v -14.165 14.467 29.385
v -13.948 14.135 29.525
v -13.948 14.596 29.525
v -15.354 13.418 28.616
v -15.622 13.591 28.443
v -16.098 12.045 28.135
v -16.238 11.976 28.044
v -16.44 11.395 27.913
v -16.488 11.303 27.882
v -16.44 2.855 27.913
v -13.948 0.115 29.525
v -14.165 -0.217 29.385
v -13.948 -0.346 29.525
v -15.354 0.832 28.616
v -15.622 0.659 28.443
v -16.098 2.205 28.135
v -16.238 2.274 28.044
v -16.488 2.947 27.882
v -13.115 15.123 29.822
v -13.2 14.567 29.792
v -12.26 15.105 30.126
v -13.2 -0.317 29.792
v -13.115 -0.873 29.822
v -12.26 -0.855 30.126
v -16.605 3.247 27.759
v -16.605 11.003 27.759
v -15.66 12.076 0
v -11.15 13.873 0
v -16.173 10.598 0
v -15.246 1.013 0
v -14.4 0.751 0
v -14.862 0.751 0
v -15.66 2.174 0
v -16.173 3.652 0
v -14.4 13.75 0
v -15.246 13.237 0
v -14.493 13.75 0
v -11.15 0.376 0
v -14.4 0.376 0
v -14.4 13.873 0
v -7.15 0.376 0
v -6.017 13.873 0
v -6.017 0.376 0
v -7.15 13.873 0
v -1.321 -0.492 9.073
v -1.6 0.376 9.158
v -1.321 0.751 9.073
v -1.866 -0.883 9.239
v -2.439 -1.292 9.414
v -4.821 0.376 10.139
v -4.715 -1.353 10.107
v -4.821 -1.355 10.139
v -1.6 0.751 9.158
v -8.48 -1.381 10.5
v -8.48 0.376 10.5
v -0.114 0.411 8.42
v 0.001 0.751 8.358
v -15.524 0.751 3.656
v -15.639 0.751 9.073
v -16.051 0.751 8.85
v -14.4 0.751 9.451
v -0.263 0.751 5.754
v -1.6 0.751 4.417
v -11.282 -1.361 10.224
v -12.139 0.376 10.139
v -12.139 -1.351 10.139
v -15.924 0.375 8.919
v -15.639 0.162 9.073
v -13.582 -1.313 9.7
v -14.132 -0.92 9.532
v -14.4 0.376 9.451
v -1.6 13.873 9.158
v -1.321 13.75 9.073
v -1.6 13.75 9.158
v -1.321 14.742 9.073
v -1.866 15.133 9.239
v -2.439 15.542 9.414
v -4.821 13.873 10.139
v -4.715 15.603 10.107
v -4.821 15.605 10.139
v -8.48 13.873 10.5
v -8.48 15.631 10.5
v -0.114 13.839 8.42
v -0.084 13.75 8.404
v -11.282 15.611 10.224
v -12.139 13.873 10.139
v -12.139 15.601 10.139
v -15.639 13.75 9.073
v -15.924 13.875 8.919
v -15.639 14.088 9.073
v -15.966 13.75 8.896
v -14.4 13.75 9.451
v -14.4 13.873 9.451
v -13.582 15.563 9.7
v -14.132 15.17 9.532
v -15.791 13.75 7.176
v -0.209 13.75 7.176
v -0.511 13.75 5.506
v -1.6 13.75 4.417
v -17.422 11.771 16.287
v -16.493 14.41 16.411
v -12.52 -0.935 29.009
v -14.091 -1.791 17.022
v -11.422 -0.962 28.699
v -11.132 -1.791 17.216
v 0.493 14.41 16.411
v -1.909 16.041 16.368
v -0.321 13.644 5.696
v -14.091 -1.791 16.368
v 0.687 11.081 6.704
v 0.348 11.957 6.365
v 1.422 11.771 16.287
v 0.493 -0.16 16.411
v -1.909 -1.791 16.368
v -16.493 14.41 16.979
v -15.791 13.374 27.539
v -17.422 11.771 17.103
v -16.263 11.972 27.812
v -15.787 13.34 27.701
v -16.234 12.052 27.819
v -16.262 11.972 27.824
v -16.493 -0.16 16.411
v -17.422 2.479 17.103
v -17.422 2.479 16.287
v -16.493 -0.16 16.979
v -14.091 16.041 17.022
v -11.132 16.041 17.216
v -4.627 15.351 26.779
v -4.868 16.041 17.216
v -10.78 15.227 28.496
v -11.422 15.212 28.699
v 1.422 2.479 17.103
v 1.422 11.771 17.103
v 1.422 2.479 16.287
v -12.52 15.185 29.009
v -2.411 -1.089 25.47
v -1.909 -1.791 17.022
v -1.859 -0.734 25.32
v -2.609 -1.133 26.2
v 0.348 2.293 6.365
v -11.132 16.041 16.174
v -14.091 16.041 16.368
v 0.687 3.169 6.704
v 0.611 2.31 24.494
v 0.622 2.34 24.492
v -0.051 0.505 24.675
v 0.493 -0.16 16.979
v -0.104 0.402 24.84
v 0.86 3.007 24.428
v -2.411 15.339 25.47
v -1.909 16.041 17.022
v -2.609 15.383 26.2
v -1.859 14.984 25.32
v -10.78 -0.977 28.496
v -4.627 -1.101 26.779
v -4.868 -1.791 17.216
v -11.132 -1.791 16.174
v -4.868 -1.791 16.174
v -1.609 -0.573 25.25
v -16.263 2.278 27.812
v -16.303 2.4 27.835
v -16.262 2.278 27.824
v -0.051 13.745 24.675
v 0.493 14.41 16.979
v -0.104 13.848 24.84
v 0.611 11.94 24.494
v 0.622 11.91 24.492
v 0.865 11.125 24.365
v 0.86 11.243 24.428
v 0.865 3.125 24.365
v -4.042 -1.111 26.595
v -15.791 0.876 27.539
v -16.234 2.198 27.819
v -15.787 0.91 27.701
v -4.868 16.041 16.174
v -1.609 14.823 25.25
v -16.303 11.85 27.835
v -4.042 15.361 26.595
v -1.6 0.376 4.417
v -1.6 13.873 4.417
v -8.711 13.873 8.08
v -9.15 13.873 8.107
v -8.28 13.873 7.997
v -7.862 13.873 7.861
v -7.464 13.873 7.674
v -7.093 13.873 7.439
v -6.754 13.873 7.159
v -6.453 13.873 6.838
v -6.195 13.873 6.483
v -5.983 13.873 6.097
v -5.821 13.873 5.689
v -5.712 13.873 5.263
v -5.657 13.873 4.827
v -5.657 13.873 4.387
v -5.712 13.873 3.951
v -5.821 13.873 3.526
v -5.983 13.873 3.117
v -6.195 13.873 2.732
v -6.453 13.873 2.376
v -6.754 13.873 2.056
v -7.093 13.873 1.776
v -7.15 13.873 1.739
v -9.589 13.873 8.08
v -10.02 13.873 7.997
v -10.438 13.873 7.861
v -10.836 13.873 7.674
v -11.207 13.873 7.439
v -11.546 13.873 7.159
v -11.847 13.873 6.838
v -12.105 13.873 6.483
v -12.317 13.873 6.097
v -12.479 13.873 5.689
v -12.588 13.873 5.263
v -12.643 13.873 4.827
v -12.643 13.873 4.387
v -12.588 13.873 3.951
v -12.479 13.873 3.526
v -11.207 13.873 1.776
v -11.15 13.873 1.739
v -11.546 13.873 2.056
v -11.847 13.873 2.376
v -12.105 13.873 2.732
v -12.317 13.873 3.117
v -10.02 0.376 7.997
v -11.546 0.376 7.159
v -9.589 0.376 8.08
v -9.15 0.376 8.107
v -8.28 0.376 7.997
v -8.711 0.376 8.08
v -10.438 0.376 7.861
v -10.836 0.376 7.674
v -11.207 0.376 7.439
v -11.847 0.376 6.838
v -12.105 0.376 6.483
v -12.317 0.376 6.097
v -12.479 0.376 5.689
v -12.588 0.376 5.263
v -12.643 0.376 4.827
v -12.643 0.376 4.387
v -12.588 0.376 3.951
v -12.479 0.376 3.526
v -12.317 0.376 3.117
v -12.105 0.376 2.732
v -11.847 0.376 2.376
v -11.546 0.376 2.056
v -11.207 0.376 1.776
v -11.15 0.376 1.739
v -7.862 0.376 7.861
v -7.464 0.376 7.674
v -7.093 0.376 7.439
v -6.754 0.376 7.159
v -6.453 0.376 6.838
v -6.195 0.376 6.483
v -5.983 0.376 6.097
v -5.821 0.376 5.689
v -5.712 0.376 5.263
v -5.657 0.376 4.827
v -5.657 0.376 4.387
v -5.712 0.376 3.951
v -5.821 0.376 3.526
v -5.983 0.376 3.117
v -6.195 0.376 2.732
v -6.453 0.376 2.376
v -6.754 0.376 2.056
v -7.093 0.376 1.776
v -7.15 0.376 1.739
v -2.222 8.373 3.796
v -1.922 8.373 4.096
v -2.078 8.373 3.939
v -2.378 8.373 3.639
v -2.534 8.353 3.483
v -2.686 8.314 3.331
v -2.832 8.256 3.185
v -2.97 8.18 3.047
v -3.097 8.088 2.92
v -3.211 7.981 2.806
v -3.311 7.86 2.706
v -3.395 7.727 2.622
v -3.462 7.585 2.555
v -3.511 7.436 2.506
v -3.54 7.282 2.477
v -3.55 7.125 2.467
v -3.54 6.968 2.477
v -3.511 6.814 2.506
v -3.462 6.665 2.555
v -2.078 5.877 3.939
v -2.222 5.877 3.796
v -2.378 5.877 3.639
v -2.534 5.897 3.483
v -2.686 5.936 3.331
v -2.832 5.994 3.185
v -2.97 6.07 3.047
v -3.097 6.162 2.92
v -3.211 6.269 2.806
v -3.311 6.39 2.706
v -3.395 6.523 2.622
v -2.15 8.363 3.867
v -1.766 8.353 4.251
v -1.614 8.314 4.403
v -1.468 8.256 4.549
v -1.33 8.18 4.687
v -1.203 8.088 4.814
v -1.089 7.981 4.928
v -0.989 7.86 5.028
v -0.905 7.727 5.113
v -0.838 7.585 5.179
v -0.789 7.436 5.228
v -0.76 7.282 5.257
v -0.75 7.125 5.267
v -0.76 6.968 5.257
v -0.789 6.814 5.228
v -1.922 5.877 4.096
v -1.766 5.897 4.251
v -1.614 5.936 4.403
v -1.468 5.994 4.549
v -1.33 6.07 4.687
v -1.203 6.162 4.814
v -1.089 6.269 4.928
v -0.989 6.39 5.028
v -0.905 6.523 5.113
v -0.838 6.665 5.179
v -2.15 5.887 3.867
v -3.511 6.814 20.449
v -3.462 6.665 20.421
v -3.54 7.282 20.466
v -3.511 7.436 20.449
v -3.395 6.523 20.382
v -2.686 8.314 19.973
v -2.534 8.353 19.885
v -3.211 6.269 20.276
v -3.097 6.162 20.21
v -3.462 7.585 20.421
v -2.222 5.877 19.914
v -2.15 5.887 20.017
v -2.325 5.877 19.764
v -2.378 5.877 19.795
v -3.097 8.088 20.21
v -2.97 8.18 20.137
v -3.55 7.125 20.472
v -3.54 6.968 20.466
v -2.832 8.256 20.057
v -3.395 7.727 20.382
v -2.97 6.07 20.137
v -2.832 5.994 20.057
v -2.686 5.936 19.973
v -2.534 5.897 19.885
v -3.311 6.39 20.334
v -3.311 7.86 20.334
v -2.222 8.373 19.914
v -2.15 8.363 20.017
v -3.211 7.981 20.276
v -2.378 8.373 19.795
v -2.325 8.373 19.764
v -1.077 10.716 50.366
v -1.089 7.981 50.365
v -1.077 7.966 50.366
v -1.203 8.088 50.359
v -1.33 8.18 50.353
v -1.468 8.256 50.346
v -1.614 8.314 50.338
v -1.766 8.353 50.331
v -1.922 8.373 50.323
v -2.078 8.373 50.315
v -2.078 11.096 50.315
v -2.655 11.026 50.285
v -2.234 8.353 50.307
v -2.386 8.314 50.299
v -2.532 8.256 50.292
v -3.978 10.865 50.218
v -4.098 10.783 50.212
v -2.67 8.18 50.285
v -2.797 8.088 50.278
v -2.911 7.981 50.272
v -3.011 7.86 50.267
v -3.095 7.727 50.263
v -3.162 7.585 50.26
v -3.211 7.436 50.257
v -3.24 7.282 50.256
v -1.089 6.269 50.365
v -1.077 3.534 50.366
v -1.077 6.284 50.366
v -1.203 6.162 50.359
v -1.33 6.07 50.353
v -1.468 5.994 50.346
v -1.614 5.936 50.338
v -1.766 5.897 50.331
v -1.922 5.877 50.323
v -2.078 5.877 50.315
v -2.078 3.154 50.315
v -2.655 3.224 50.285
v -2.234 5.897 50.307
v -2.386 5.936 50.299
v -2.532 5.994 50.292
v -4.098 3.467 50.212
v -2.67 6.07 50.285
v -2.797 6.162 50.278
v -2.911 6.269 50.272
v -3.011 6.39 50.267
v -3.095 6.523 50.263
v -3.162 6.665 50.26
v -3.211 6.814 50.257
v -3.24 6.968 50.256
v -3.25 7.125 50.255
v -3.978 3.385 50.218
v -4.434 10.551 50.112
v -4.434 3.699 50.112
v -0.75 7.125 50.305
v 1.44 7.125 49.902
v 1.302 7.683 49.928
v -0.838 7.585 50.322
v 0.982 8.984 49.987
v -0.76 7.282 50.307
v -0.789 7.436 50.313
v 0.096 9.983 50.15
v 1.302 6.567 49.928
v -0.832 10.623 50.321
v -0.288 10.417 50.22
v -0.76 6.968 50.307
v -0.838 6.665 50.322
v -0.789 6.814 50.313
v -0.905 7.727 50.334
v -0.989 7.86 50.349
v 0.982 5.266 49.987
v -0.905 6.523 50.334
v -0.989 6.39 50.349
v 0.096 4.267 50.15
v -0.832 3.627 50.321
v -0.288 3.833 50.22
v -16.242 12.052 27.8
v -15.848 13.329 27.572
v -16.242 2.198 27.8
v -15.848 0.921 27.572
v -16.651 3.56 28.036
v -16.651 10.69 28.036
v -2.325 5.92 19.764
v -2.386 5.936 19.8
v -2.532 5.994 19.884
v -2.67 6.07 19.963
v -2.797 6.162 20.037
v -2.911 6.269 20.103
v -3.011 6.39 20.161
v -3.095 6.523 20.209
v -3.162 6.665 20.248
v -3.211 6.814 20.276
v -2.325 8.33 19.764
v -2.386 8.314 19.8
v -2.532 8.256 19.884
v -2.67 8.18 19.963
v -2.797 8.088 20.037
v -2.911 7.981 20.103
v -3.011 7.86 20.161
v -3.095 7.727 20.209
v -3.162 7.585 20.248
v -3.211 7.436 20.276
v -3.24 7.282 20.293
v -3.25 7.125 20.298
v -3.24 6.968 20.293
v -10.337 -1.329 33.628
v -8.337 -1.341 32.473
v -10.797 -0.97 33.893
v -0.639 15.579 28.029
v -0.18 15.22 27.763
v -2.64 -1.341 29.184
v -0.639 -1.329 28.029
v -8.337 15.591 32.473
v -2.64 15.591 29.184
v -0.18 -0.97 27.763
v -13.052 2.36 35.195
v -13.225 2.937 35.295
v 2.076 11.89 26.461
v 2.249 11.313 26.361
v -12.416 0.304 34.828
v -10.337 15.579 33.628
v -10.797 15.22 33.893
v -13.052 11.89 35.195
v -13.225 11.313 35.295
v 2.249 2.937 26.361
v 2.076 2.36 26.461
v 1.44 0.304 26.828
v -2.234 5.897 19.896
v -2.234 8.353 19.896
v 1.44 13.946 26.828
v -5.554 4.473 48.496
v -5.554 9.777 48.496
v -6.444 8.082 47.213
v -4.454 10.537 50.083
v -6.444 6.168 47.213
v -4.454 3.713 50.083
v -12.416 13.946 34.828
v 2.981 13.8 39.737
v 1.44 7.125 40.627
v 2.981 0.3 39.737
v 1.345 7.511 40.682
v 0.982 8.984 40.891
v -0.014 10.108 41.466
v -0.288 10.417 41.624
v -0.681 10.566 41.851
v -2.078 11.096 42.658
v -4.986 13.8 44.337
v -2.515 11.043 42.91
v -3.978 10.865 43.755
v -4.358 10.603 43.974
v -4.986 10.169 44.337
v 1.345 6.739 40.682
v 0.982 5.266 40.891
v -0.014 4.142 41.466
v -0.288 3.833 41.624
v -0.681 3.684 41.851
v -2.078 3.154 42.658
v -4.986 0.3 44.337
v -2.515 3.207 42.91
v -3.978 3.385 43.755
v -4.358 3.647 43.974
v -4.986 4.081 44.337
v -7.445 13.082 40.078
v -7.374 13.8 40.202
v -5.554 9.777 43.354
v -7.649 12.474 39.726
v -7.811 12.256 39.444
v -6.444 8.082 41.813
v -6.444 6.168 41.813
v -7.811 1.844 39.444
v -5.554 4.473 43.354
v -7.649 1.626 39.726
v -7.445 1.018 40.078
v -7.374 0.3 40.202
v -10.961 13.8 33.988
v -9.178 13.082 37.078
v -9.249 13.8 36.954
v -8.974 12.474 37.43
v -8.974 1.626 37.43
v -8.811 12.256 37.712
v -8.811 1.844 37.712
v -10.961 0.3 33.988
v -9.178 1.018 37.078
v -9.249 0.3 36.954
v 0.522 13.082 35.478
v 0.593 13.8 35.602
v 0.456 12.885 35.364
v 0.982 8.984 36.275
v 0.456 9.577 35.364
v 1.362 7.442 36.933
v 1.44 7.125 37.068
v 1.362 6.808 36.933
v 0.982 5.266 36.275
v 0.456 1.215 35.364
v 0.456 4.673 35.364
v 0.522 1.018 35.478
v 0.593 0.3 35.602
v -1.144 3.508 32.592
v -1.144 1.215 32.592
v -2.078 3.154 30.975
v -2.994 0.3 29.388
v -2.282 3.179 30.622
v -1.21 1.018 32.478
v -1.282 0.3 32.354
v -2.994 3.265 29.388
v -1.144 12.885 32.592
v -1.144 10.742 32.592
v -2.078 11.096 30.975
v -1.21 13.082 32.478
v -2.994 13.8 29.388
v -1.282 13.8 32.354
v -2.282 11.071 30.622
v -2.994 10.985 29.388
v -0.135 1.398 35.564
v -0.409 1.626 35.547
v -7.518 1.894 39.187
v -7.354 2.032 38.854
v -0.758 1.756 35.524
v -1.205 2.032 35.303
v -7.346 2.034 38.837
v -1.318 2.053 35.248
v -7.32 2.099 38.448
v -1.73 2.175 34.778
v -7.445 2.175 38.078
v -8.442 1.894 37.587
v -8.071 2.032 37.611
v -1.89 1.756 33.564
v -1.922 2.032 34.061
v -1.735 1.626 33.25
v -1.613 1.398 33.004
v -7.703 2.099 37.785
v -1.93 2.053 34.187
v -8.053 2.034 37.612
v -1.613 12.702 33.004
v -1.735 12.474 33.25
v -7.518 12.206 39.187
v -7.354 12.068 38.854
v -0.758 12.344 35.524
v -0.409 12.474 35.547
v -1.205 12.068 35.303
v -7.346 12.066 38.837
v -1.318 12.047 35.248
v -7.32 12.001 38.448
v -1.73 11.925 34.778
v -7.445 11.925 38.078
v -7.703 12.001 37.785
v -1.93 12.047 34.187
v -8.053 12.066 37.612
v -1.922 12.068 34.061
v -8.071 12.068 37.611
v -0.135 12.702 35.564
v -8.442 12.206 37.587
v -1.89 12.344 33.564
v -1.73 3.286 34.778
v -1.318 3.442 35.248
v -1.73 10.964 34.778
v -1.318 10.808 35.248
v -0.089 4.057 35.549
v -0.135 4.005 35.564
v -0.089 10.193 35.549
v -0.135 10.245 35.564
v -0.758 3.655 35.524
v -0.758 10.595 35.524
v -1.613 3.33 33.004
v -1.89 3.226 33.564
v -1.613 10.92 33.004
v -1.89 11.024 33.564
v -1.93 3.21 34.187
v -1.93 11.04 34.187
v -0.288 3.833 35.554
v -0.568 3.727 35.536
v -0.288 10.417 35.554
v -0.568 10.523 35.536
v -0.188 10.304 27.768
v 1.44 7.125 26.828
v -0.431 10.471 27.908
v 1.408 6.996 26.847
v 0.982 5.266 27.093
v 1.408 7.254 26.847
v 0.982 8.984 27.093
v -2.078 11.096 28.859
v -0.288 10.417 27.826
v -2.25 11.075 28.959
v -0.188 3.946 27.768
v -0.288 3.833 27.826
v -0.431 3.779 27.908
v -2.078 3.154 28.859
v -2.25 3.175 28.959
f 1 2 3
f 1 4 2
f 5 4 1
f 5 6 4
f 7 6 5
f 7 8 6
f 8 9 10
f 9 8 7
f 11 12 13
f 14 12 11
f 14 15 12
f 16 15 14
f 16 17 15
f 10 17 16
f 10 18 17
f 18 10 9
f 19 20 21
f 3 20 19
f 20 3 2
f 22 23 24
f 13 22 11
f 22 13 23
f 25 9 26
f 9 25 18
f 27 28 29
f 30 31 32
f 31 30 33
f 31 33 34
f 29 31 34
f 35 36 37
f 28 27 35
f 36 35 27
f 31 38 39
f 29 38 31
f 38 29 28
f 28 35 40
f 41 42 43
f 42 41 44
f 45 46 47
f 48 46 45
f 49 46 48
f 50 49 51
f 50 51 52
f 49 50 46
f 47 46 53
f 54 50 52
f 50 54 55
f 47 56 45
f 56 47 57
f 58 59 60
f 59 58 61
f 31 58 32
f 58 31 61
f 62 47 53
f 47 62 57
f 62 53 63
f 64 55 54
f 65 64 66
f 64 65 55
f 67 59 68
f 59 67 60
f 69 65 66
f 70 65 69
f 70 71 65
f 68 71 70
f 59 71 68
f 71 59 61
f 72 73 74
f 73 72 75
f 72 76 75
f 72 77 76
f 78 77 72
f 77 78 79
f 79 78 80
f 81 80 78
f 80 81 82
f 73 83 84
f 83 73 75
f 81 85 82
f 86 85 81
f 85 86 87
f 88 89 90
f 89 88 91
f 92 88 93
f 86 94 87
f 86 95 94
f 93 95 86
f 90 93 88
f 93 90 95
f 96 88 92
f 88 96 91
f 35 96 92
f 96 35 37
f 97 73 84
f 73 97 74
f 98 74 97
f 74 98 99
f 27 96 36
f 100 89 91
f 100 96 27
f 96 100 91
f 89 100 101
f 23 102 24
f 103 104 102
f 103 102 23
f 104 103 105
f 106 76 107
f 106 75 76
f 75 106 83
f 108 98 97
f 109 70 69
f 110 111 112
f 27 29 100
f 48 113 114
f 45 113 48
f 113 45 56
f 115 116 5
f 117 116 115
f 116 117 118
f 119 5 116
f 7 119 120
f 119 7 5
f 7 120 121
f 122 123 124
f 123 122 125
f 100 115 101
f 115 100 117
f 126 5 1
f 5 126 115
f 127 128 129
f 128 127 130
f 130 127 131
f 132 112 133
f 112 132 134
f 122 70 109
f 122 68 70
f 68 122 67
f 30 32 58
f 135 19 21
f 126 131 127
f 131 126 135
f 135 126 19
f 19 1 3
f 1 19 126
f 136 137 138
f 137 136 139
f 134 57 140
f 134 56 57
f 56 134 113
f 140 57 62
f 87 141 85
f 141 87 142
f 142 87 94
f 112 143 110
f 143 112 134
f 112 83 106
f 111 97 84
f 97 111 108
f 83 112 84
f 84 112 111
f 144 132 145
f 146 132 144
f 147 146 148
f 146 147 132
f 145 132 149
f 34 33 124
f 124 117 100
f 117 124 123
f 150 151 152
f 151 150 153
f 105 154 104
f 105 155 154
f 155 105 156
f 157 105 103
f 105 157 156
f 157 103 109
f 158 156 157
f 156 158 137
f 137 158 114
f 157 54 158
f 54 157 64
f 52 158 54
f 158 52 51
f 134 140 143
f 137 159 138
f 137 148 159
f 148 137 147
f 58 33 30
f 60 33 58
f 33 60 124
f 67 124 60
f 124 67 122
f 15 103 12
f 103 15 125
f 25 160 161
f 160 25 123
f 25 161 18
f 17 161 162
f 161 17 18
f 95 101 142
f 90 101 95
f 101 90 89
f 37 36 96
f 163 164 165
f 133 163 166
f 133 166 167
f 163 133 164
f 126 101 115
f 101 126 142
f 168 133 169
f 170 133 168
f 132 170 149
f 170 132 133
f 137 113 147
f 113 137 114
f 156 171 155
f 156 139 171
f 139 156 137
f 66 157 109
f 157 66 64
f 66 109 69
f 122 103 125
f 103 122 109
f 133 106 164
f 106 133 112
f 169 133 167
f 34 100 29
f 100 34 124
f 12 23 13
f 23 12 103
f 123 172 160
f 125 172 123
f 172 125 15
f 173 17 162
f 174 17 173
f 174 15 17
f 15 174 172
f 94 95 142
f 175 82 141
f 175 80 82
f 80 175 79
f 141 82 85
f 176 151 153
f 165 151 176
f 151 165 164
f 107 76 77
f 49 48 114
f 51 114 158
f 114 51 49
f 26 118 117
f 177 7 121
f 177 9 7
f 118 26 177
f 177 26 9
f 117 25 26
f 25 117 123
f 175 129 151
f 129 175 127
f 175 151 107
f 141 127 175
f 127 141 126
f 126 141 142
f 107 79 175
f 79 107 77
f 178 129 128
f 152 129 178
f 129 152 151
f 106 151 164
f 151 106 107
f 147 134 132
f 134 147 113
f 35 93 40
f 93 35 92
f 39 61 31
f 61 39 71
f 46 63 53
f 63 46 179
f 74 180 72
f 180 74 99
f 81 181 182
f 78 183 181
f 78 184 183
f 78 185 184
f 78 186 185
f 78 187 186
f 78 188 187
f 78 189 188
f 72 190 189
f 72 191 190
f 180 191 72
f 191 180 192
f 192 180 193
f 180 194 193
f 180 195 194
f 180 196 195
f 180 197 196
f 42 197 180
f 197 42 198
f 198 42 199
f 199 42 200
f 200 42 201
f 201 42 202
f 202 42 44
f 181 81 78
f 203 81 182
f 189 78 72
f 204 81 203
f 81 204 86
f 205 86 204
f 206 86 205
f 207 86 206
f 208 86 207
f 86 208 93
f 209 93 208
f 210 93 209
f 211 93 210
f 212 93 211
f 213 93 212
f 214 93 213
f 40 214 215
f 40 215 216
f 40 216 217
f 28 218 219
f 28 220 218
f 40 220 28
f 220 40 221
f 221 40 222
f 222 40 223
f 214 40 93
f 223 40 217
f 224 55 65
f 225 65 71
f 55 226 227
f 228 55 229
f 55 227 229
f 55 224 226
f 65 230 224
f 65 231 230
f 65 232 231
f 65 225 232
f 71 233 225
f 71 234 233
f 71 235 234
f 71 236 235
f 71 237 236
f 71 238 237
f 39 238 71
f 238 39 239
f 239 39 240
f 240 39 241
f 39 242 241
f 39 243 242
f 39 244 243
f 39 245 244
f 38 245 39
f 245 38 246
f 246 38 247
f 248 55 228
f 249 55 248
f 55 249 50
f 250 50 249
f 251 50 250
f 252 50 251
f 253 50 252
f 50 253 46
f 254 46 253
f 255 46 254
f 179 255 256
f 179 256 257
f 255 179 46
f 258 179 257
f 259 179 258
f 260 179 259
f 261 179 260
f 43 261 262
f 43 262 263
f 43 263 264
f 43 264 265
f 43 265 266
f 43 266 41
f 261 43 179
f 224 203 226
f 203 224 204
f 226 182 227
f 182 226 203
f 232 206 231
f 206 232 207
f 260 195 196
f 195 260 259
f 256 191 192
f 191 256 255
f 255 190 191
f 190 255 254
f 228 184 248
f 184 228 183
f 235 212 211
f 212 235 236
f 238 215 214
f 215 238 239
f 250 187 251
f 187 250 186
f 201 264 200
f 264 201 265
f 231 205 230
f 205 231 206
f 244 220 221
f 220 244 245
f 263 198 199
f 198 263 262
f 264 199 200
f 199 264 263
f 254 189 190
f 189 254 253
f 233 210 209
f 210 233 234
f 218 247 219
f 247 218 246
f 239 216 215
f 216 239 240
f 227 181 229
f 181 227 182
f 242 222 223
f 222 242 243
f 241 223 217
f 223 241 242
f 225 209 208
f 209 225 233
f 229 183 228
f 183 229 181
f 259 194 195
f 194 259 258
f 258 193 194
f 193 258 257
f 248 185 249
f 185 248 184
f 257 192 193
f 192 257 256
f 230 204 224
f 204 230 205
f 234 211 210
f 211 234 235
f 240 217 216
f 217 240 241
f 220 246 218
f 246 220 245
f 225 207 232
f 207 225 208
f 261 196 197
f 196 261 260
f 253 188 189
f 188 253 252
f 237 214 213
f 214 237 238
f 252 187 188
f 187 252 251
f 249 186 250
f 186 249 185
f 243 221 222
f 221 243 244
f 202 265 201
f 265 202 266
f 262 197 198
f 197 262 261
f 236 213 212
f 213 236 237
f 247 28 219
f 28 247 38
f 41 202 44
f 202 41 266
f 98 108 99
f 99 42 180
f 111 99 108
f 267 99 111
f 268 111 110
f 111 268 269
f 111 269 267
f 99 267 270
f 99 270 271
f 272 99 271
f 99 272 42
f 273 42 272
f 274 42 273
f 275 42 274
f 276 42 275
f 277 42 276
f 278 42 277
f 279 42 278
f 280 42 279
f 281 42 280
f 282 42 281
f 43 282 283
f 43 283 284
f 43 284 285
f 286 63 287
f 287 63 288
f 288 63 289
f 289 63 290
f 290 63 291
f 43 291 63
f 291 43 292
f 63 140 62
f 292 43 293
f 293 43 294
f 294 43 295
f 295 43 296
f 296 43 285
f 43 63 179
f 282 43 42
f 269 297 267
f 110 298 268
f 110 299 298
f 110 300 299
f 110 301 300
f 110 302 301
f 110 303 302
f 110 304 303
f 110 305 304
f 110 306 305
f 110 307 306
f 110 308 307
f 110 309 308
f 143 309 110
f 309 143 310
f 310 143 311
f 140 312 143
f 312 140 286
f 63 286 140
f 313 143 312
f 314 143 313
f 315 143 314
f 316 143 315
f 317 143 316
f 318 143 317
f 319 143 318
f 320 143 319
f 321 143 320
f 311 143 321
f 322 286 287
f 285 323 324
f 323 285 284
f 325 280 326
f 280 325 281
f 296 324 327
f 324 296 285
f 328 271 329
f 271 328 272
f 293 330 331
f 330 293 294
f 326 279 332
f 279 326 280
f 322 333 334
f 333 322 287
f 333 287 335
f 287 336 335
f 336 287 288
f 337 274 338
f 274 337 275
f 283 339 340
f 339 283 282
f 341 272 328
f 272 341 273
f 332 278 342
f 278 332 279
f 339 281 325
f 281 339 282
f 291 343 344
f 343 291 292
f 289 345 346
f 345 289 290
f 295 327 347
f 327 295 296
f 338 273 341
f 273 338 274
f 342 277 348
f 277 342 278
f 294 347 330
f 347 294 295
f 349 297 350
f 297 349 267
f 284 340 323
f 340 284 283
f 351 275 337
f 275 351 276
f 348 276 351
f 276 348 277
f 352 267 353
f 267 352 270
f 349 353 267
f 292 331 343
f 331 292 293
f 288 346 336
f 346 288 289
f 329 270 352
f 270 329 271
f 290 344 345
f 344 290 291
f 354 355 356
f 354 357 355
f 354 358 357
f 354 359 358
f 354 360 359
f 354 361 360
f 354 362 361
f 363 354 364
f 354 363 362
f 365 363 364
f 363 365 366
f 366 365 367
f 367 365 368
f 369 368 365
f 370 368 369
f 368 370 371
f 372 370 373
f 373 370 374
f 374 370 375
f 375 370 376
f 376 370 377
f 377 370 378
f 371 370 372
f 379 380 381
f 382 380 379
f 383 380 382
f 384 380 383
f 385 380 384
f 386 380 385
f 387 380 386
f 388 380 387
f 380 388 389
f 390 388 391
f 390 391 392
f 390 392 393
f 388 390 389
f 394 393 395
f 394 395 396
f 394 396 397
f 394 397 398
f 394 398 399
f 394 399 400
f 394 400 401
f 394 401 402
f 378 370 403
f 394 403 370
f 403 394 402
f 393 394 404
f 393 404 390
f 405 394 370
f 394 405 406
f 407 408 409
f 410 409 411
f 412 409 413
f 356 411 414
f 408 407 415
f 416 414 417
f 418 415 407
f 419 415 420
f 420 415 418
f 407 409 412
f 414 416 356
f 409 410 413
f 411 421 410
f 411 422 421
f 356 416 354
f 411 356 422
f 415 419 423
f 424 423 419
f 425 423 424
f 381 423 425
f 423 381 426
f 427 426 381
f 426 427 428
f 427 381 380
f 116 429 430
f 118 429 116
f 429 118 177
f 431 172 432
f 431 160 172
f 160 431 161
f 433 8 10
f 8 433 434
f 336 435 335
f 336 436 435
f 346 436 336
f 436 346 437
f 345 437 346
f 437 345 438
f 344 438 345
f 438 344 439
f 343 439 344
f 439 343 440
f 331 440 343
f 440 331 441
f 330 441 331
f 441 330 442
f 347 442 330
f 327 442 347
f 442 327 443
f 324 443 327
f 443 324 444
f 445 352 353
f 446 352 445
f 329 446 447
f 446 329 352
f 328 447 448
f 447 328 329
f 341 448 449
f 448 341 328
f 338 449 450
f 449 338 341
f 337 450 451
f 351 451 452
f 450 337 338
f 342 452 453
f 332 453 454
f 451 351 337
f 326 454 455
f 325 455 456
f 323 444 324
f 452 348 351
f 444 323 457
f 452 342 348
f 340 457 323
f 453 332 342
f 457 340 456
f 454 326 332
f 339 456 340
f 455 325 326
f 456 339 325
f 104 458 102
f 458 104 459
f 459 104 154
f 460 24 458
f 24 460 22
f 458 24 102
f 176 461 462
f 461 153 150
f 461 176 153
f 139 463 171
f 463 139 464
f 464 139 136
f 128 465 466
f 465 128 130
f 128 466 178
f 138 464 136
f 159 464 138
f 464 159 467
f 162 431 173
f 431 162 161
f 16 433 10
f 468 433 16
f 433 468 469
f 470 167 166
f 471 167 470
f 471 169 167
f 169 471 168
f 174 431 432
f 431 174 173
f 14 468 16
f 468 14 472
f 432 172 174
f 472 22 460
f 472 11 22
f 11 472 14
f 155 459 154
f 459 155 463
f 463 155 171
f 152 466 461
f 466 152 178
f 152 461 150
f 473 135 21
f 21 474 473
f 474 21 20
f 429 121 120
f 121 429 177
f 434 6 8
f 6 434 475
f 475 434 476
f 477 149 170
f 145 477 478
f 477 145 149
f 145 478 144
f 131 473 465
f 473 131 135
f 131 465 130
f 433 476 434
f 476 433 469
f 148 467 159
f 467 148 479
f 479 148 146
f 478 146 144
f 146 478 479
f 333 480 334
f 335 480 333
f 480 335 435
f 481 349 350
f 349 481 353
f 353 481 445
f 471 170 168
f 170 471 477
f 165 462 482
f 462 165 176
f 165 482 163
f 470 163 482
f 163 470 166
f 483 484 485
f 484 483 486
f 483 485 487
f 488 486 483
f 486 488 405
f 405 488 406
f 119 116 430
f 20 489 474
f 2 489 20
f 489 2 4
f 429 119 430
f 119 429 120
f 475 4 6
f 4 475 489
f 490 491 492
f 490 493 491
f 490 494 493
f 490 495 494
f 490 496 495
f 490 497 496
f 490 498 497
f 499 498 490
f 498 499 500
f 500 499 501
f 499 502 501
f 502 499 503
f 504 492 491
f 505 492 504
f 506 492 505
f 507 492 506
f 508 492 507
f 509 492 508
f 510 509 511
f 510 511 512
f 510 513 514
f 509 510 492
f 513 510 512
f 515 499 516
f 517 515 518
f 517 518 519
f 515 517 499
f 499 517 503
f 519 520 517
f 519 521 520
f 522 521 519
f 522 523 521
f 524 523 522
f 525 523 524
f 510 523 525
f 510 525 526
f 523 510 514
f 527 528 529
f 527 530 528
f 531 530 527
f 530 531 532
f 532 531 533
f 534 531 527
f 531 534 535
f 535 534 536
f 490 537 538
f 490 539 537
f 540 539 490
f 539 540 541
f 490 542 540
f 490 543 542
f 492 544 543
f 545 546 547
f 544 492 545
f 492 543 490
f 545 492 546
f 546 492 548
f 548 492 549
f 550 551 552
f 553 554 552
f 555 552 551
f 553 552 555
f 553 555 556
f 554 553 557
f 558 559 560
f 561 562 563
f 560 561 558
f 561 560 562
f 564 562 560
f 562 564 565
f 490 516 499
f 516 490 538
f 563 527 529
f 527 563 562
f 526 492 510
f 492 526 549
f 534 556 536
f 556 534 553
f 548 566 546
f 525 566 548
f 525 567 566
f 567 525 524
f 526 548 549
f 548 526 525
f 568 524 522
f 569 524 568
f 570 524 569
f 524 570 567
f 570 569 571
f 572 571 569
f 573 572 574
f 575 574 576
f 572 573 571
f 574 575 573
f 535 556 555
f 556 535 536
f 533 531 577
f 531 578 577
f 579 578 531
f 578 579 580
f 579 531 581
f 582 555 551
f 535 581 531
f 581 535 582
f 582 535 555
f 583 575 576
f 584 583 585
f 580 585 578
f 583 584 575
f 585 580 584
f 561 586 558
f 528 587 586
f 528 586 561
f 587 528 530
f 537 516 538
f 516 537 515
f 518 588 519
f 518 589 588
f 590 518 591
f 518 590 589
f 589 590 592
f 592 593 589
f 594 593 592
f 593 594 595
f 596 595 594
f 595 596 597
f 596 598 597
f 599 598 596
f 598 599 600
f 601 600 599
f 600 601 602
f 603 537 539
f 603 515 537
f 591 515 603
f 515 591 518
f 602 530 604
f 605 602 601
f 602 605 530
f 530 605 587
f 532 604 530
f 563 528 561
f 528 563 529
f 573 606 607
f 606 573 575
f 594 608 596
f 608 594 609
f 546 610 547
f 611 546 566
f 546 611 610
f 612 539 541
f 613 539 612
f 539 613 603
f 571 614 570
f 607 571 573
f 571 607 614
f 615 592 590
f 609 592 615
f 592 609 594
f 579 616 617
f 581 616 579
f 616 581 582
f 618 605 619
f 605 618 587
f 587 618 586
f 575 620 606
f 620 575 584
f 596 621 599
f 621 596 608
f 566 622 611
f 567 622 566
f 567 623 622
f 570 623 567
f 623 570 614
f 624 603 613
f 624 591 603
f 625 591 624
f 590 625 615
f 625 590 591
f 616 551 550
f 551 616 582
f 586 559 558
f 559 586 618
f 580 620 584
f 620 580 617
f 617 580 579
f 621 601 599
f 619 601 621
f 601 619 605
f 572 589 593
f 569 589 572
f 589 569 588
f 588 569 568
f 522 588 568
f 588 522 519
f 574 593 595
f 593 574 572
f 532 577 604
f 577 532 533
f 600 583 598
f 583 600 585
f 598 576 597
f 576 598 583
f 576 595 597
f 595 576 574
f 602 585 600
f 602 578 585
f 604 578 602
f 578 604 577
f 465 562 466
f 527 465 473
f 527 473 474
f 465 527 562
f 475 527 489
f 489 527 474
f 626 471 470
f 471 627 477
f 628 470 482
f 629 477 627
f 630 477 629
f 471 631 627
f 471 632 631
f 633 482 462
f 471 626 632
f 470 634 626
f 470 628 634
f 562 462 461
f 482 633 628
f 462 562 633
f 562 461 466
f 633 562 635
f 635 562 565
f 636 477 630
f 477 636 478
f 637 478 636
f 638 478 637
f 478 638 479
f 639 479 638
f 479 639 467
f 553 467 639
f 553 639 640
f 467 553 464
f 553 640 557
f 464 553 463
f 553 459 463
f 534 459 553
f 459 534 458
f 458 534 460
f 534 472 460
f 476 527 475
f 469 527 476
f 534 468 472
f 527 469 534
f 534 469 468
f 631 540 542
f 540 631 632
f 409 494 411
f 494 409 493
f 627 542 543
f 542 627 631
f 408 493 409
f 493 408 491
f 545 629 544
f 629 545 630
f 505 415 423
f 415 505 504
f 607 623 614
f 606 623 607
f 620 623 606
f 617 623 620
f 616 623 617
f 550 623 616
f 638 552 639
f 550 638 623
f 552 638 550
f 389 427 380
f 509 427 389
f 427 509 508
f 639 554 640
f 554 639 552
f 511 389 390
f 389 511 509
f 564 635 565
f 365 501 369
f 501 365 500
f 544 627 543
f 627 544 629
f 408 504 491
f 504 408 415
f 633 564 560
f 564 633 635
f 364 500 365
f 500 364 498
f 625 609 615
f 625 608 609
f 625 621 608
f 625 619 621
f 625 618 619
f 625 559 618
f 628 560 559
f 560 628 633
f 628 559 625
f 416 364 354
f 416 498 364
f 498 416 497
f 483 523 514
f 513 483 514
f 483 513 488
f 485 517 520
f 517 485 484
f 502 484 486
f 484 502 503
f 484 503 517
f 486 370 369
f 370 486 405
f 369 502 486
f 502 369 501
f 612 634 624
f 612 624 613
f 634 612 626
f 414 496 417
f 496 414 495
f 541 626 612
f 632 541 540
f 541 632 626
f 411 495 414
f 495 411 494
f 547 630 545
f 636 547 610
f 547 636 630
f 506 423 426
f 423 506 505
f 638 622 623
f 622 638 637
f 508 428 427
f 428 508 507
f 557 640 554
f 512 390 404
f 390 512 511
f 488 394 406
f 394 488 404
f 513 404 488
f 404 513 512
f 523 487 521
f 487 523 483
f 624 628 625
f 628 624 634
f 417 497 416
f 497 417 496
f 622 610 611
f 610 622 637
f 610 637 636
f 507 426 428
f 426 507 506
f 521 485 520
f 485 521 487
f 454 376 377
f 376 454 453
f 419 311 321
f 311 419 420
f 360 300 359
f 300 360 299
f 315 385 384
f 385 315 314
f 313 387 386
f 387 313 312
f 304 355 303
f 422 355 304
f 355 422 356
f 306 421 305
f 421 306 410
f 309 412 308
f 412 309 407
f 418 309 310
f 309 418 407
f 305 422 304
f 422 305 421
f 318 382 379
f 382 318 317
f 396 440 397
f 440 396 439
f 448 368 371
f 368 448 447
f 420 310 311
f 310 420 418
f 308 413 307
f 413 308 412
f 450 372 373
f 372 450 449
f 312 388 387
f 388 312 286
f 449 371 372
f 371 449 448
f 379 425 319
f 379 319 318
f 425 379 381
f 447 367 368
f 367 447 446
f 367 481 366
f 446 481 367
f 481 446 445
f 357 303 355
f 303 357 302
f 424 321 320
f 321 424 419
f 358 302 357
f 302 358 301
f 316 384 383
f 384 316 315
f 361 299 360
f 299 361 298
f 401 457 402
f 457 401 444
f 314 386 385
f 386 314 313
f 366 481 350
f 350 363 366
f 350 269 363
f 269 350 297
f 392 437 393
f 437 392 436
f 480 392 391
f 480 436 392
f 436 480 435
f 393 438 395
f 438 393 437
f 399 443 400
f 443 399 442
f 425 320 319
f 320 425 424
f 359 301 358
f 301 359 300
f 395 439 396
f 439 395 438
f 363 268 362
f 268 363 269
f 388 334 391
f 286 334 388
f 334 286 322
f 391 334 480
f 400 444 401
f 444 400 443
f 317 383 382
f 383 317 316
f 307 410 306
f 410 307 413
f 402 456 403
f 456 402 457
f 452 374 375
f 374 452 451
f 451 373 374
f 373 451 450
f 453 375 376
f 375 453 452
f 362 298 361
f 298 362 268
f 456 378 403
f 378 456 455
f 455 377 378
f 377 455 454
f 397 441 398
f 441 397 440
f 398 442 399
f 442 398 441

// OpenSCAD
// file: util/finger_mid.scad
include <../../config.scad>
use <finger_base.scad>

rotate([0,-90,0]) fingermid();

//	Middle segment of finger, can be lengthened
module fingermid(length=19, proximalHole=true, distalHole=true)
{
	difference() {
		scale([yScaleFactor,xScaleFactor,zScaleFactor]) {
			fingerbasesolid(length);
		}
		if(proximalHole) {
			translate([0,knucklePadding/2 * xScaleFactor,0]) fingerhardwarecutouts(jointDia, jointThick, knuckleW=knuckleW-knucklePadding, fingerLen=length);
		}
		if(distalHole) {
			translate([length * yScaleFactor,0,0]) mirror([1,0,0]) fingerhardwarecutouts(jointDia, jointThick, knuckleW=knuckleW, fingerLen=length);
		}
	}
}
// file: util/finger_base.scad
include <../../config.scad>

rotate([0,-90,0]) fingerbase();

//	Base segment of finger, can be lengthened
module fingerbase(length=20, proximalHole=true, distalHole=true)
{
	difference() {
		scale([yScaleFactor,xScaleFactor,zScaleFactor]) {
			fingerbasesolid(length);
		}
		if(proximalHole) {
			translate([0,knucklePadding/2 * xScaleFactor,0]) fingerhardwarecutouts(jointDia, jointThick, knuckleW=knuckleW-knucklePadding, fingerLen=length);
		}
		if (distalHole) {
			translate([length * yScaleFactor,0,0]) mirror([1,0,0]) fingerhardwarecutouts(jointDia, jointThick, knuckleW=knuckleW, fingerLen=length);
		}
	}


	
}

module fingerhardwarecutouts(jointDia,jointThick,knuckleW,fingerLen,holeCutoff=100) {
	//slot for flex joint
	translate([7 - (15/jointDia),0,6*zScaleFactor - (1.8/jointThick)]) {
		rotate([90,0,0]) translate([-0.25,0,-knuckleW*xScaleFactor]) cylinder(d=jointDia, h=knuckleW*xScaleFactor, $fn=50);
		translate([-25,(knuckleW*xScaleFactor) / 2,0]) cube([50,knuckleW*xScaleFactor,jointThick], center=true);
	}
	//cubic parts
	translate([-100,0,0]) cube([100,knuckleW*xScaleFactor,100]);
	translate([-13/zScaleFactor,0,0]) rotate([0,45,0]) translate([-50,0,0]) cube([100,knuckleW * xScaleFactor, 10]);

	//channel for string/tendon
	translate([-fingerLen/2 * yScaleFactor, knuckleW/2 * xScaleFactor, 2.3]) rotate([0,90,0]) cylinder(d=2.5, h=holeCutoff, $fn=50);
}

//	base segment of finger, solid
module fingerbasesolid(length=50, cutout=true) {
	difference() {
		//cubic part
		translate([0,0.001 + knucklePadding/2,1]) cube([length, knuckleW - knucklePadding - 0.002, 8]);
	}
	
	//cylindrical-ish part around finger
	intersection() {
		//overly large shape to get the cross section in the XZ plane from
		difference() {
			union() {
				translate([length-4,-5,5]) rotate([-90,0,0]) cylinder(r=8,h=knuckleW + 10);
				translate([0,-5,-5]) cube([length,knuckleW + 10,20]);
			}
			//cutout for the side "guards" of the previous knuckle
			if(cutout) {
				translate([-4,-knuckleW+0.001,5.3]) rotate([-90,0,0]) cylinder(r=11,h=10);
				translate([-4,knuckleW - knucklePadding*(1/xScaleFactor),5.3]) rotate([-90,0,0]) cylinder(r=11,h=10);
			}
		}

		hull() {
			for(i=[-1,1], j=[-1,1]) {
				//angled cylinders to provide the outer shape of the finger
				translate([length/10,i*2.4 + knuckleW/2,j*2.2 + 5]) rotate([i*j*-4,j*86,0]) cylinder(d=6,h=20,center=true);
				translate([length+4, i*2.4 + knuckleW/2, j*2.2 + 5]) rotate([i*j*-4,j*-86,0]) cylinder(d=6,h=20,center=true);
			}
		}
	}
}
// file: util/finger_tip.scad
include <../../config.scad>
use <finger_base.scad>
use <finger_mid.scad>

rotate([0,-90,0]) fingertip_curved_solid(pad=fingerPads);

module fingertip_curved_solid(length=17, pad=true, hole=true) {
//	if (!pad)
//		fingertip(length=length);
//	else {
		render() difference() {
			union() {
				fingermid(length=length+3, proximalHole=true, distalHole=false);
				translate([length*yScaleFactor - 0.5,0,1.6*zScaleFactor]) rotate([0,30,0]) fingertip(length=15, proximalHole=false, cutout=false);
			}
			//hole for string
			if(hole) translate([0,xScaleFactor * knuckleW/2,2]) rotate([0,90,0]) cylinder(d=2.5,h=100, $fn=50);
			//hollow for soft pad
			if(pad) translate([length*yScaleFactor - 0.5,0,1.6*zScaleFactor]) rotate([0,30,0]) fingertip_pad(length=15);
		}
//	}
}

module fingertip_solid(length=15, pad=true) {
	if (!pad)
		fingertip(length=length);
	else {
		render() difference() {
			fingertip(length=length);
			if(pad) fingertip_pad(length);
		}
	}
}

module fingertip_pad(length) {
	difference() {
		fingertip(length,pad=false, proximalHole=false, cutout=false);
		translate([0,-10,-10]) cube([length-7,50,50]);
		assign($fn = 16) difference() {
			translate([0,0.2*xScaleFactor,3.2*zScaleFactor]) cube([length+(3.3*yScaleFactor),xScaleFactor * (knuckleW - knucklePadding),5.75*zScaleFactor]);
			//grooves for attachment of silicone pad:
			translate([(length+(3.3*yScaleFactor))/3*2, 0.2*xScaleFactor, 3.2*zScaleFactor]) cylinder(d=2.5*yScaleFactor,h=5.75*zScaleFactor);
			translate([(length+(3.3*yScaleFactor))/3*2, 0.2*xScaleFactor + (xScaleFactor * (knuckleW - knucklePadding)), 3.2*zScaleFactor]) cylinder(d=2.5*yScaleFactor,h=5.75*zScaleFactor);
			translate([(length+(3.3*yScaleFactor))/3*2, 0.2*xScaleFactor, 3.2*zScaleFactor]) rotate([-90,0,0]) cylinder(d=2*zScaleFactor,h=xScaleFactor * (knuckleW - knucklePadding));
			translate([(length+(3.3*yScaleFactor))/3*2, 0.2*xScaleFactor, 3.2*zScaleFactor + 5.75*zScaleFactor]) rotate([-90,0,0]) cylinder(d=1.25*zScaleFactor,h=xScaleFactor * (knuckleW - knucklePadding));
		}
		//"fingernail":
		translate([0,xScaleFactor * knuckleW/2,0]) {
			rotate([0,60,0]) cylinder(d=8, h=100);
		}
	}
}

//	tip segment of finger, can be lengthened
module fingertip(length=15, proximalHole=true, cutout=true)
{
	intersection() {
		difference() {
			scale([yScaleFactor,xScaleFactor,zScaleFactor]) {
				fingerbasesolid(length,cutout);
			}
			if(proximalHole) {
				translate([0,knucklePadding/2 * xScaleFactor,0]) fingerhardwarecutouts(jointDia, jointThick, knuckleW=knuckleW-knucklePadding, fingerLen=length, holeCutoff=(length-0.5)*2);
				translate([(length - 5) * yScaleFactor,(knuckleW/2) * xScaleFactor,0])
					rotate([0,30,0]) translate([0,0,2]) cylinder(d=2.5, h=100, $fn=50);
			}
		}
		translate([(length-10)*xScaleFactor,0,21*zScaleFactor]) rotate([-90,0,0]) cylinder(d=70, h=100, center=true);
	}
}
// file: ../config.scad
/**
 * Configuration settings for Flexy Beast, required to generate correctly sized STLs of the printed parts. See the Configuration File Assembly instructions to set this up.
 * @id config_file
 * @name Configuration File
 * @category Prerequisites!
 * @step Open config.scad in your favorite text editor.
 * @step As per the normal Cyborg Beast instructions, measure the width of the knuckles in the non-affected hand and convert to millimeters.
 * @step Add 5 to that result and then divide by 55.
 * @step Replace the x-, y-, and zScaleFactor variables in config.scad with that number.
 * @step If desired, adjust the proportions of the hand by changing those variables individually. xScaleFactor controls the width of the hand, yScaleFactor controls the length, and zScaleFactor controls the height.
 * @step Open assembly.scad in OpenSCAD to check that the flexy joint holes are not too large for the hand (should only be necessary for small children). If necessary, reduce the jointDia and jointThick variables. jointDia=5 and jointThick=2 is a good amount for smaller hands.
 * @step Set the fingerPads variable to true or false depending on whether you want to cast silicone finger pads for improved grip.
 * @step Open palm.scad, finger_base.scad, finger_tip.scad, and thumb_tip.scad in OpenSCAD, render each part (F6), and export as STL, then print. Suggested print settings are 0.2mm or smaller layer height, 3 perimeters, and 25% rectilinear or hexagonal infill.
 */

knuckleR = 4.85;
knucklePadding = 0.5;
knuckleW = 9.5;
wristH = 10;
palmH = 20;
palmW = 64;
th = 3;
fn = 32;

//flexy joint parameters
jointDia = 7;
jointThick = 4;

//finger settings
fingerPads = true; //whether or not to hollow the finger tips slightly for molding pads
fingerLength = 1; //multiply the length of all fingers by this amount
thumbProp = 0.8; //proportion of thumb length relative to other fingers (note that the thumb is a segment shorter than the other fingers already)
indexProp = 0.8; //proportion of index finger length relative to other fingers
middleProp = 1; //proportion of middle finger length relative to other fingers
ringProp = 0.8; //proportion of ring finger length relative to other fingers
pinkyProp = 0.7; //proportion of pinky finger length relative to other fingers

//misc settings
thermoform = true; //whether or not to generate a thermoformable mesh for the palm

//desired scale factor for hand based on the standard Cyborg Beast/Robohand sizing guide
xScaleFactor = 1.5; // [1.05:1.60]
yScaleFactor = 1.5; // [1.05:1.60]
zScaleFactor = 1.6; // [1.05:1.60]
// main file
include <../config.scad>
use <util/finger_tip.scad>

rotate([0,-90,0]) fingertip_curved_solid(length = 17*ringProp*fingerLength, pad=fingerPads);

/**
 * Distal phalanx of ring finger - rendered from parts/finger_ring_tip.scad
 * @id ring_tip
 * @name Ring Finger Tip
 * @category Printed
 */
